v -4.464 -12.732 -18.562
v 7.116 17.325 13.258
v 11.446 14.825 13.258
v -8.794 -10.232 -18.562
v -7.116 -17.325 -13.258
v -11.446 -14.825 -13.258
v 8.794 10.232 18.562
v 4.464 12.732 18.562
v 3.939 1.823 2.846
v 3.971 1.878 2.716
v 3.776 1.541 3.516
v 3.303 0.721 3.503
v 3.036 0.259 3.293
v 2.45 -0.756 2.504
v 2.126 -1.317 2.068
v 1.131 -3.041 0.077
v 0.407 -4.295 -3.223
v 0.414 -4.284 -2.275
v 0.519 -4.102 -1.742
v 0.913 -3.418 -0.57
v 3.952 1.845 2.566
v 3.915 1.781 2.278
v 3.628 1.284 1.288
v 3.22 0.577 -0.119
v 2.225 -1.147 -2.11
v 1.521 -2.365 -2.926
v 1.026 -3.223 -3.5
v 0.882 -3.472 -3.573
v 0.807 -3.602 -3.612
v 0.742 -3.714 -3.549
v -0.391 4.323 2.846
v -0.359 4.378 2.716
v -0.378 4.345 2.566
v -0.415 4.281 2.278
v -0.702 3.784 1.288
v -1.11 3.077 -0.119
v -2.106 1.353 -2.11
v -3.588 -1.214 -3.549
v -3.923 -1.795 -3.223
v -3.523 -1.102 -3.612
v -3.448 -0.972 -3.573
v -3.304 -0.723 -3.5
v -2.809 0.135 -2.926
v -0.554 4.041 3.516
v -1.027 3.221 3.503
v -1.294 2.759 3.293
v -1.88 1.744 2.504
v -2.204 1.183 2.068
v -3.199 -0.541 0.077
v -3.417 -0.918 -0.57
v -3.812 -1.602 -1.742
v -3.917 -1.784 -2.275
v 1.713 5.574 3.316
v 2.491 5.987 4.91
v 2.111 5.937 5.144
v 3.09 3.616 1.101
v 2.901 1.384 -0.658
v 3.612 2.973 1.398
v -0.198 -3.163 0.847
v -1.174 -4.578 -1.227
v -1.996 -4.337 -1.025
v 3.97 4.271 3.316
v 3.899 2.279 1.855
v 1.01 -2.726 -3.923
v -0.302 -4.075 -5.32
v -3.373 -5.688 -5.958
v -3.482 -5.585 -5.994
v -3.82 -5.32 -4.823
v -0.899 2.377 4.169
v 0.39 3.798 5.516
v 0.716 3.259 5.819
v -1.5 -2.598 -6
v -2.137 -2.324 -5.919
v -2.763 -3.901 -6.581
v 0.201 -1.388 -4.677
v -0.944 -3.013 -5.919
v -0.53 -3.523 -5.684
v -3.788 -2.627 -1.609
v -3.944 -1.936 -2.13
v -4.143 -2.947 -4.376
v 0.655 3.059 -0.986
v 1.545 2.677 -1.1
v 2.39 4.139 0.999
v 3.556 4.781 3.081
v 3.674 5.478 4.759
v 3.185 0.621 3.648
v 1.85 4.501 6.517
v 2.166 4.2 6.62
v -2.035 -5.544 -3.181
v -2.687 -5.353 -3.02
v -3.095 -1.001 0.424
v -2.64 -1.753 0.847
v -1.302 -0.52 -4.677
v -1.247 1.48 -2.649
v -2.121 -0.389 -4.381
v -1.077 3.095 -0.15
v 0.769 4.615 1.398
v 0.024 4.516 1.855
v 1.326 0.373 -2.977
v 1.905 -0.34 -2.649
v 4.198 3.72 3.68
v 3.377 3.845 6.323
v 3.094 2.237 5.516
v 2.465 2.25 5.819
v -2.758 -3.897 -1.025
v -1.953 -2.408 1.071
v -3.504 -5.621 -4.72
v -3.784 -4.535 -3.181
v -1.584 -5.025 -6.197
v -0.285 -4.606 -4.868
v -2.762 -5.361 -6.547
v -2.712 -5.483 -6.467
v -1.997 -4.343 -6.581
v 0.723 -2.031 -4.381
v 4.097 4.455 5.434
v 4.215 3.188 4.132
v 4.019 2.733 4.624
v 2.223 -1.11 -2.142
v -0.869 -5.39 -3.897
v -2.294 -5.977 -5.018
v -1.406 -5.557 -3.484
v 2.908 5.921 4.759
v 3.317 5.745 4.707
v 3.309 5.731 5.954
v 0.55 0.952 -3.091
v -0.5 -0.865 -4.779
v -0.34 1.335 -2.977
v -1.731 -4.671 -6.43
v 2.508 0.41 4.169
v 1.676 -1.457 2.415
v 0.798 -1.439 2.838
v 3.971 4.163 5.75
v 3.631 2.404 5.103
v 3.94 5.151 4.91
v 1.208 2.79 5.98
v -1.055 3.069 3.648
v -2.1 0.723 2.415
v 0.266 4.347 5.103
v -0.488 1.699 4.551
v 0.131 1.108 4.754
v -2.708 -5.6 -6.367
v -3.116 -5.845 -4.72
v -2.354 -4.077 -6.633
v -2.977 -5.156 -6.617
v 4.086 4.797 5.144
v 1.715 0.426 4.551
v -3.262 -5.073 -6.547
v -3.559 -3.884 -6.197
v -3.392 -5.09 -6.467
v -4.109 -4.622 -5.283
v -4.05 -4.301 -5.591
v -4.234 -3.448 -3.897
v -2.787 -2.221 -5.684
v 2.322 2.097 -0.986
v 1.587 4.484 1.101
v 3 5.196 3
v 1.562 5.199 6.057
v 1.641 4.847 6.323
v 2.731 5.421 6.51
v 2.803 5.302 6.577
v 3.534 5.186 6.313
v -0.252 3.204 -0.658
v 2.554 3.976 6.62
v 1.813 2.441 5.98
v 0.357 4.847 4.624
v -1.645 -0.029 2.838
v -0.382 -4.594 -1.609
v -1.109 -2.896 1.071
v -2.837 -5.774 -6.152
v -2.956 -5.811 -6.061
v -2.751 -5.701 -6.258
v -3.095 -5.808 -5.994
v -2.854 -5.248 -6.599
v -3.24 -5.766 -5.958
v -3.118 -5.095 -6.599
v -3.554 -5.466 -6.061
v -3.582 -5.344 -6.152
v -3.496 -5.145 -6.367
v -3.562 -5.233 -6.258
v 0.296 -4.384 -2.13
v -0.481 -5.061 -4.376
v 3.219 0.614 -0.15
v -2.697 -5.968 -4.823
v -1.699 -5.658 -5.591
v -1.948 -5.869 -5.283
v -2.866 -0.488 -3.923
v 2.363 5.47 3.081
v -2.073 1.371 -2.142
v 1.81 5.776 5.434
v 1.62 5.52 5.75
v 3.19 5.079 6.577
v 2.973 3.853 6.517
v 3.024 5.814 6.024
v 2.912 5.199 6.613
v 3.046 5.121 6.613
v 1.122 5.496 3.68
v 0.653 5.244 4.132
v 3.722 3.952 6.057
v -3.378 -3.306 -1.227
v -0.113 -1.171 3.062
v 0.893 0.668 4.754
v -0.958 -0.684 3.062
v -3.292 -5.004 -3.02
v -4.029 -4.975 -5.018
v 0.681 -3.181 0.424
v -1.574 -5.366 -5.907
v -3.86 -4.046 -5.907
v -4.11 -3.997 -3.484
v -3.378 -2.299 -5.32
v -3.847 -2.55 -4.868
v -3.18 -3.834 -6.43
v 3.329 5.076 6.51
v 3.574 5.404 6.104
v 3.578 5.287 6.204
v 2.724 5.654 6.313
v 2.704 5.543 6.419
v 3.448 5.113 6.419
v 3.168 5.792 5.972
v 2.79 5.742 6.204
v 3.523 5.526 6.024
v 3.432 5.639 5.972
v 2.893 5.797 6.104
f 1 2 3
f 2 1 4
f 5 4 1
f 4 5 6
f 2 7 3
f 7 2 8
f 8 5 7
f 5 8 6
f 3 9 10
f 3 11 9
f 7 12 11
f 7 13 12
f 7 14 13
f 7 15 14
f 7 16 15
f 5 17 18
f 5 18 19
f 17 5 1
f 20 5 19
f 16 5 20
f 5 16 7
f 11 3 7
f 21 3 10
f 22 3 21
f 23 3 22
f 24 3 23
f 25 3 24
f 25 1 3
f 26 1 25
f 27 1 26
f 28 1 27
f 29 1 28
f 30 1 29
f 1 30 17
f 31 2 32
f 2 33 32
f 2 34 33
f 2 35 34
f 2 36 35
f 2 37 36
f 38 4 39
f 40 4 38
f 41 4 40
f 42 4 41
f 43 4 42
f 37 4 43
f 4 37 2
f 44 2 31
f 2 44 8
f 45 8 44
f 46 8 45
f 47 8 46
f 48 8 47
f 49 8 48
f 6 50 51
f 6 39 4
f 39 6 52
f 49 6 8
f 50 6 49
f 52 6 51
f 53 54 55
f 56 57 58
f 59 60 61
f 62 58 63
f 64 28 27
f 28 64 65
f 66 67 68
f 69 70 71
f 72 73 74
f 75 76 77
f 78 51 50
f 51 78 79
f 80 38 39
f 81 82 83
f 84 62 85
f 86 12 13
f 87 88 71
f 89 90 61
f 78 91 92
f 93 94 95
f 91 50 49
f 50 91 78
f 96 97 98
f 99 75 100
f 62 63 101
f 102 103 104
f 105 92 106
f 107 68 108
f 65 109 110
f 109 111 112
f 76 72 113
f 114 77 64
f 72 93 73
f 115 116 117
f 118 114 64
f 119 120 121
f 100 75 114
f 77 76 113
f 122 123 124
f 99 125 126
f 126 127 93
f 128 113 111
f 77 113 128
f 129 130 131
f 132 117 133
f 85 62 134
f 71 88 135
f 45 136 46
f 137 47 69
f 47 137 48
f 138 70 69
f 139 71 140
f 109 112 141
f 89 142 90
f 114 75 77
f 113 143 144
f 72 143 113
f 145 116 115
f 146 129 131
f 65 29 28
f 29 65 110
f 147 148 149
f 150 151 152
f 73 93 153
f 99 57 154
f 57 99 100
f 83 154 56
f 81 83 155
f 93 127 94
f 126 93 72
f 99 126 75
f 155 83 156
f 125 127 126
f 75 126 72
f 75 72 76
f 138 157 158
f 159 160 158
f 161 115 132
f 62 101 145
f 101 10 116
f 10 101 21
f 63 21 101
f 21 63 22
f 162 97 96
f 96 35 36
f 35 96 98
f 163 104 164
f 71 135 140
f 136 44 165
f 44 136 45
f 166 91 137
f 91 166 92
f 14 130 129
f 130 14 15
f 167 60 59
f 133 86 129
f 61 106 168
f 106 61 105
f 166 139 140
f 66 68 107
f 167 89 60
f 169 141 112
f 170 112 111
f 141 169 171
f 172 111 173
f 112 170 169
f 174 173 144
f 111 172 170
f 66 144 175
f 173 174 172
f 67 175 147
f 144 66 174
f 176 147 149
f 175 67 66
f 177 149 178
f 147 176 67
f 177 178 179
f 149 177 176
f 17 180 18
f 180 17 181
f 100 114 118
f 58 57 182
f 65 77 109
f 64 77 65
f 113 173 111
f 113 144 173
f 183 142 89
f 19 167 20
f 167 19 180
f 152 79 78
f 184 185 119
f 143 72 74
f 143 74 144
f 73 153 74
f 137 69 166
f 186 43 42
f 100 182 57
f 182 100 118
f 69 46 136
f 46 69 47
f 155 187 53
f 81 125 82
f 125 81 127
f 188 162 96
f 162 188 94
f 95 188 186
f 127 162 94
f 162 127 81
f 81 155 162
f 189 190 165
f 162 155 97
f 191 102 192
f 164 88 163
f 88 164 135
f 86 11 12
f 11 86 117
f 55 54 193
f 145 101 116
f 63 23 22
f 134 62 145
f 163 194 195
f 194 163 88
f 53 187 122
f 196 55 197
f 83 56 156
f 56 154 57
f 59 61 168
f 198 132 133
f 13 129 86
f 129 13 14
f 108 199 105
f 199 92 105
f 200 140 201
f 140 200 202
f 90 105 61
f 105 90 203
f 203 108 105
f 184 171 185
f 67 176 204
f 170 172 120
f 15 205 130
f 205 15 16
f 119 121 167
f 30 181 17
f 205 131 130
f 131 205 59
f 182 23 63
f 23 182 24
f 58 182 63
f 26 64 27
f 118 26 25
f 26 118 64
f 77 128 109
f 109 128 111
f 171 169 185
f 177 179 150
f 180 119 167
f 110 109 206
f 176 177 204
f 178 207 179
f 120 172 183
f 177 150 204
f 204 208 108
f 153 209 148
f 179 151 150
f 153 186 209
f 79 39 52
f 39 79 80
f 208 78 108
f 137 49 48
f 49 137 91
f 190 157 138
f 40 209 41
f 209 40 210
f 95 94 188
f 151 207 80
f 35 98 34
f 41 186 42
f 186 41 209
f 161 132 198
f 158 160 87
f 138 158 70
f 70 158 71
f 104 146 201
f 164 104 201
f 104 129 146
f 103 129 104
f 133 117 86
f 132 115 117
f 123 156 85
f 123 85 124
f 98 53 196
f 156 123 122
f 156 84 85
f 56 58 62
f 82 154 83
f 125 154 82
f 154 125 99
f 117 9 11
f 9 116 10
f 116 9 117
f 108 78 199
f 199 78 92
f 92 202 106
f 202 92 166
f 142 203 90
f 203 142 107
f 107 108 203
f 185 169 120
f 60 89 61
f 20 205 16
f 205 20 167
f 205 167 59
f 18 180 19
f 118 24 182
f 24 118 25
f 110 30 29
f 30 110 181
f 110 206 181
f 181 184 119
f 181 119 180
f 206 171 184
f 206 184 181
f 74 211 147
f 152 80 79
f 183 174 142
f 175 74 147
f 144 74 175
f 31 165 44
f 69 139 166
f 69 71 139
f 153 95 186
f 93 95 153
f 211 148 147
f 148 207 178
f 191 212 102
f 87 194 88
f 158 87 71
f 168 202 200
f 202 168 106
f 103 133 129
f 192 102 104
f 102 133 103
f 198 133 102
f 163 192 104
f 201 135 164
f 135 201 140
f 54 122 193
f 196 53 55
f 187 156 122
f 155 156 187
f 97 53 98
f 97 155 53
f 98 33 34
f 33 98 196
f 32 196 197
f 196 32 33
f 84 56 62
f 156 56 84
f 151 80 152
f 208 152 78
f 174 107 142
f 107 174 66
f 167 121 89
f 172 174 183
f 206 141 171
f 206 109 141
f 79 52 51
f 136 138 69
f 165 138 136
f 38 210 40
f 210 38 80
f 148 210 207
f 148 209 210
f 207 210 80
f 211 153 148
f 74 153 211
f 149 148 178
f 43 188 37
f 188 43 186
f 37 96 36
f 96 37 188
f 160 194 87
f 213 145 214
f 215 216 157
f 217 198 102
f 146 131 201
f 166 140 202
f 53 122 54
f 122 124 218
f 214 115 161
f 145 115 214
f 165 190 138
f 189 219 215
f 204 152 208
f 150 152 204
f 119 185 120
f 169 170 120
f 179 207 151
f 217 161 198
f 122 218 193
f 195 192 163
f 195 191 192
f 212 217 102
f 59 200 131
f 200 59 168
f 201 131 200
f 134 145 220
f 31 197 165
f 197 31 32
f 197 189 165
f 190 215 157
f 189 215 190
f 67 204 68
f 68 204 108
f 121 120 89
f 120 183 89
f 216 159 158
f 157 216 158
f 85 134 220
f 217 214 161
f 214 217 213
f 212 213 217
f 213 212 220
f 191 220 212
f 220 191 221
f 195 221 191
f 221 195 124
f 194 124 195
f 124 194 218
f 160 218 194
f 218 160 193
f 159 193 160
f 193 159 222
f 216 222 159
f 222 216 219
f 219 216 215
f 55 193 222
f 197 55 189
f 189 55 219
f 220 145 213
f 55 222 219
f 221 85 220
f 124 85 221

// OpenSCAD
// Generated by generate_scads.py
rotate([180,45,60]) {
  scale([0.5,0.5,1.5]) {
    difference() {
      cube(size=[15,10,30], center=true);
      sphere(r=6);
      sphere(r=6);
    }
  }
}
